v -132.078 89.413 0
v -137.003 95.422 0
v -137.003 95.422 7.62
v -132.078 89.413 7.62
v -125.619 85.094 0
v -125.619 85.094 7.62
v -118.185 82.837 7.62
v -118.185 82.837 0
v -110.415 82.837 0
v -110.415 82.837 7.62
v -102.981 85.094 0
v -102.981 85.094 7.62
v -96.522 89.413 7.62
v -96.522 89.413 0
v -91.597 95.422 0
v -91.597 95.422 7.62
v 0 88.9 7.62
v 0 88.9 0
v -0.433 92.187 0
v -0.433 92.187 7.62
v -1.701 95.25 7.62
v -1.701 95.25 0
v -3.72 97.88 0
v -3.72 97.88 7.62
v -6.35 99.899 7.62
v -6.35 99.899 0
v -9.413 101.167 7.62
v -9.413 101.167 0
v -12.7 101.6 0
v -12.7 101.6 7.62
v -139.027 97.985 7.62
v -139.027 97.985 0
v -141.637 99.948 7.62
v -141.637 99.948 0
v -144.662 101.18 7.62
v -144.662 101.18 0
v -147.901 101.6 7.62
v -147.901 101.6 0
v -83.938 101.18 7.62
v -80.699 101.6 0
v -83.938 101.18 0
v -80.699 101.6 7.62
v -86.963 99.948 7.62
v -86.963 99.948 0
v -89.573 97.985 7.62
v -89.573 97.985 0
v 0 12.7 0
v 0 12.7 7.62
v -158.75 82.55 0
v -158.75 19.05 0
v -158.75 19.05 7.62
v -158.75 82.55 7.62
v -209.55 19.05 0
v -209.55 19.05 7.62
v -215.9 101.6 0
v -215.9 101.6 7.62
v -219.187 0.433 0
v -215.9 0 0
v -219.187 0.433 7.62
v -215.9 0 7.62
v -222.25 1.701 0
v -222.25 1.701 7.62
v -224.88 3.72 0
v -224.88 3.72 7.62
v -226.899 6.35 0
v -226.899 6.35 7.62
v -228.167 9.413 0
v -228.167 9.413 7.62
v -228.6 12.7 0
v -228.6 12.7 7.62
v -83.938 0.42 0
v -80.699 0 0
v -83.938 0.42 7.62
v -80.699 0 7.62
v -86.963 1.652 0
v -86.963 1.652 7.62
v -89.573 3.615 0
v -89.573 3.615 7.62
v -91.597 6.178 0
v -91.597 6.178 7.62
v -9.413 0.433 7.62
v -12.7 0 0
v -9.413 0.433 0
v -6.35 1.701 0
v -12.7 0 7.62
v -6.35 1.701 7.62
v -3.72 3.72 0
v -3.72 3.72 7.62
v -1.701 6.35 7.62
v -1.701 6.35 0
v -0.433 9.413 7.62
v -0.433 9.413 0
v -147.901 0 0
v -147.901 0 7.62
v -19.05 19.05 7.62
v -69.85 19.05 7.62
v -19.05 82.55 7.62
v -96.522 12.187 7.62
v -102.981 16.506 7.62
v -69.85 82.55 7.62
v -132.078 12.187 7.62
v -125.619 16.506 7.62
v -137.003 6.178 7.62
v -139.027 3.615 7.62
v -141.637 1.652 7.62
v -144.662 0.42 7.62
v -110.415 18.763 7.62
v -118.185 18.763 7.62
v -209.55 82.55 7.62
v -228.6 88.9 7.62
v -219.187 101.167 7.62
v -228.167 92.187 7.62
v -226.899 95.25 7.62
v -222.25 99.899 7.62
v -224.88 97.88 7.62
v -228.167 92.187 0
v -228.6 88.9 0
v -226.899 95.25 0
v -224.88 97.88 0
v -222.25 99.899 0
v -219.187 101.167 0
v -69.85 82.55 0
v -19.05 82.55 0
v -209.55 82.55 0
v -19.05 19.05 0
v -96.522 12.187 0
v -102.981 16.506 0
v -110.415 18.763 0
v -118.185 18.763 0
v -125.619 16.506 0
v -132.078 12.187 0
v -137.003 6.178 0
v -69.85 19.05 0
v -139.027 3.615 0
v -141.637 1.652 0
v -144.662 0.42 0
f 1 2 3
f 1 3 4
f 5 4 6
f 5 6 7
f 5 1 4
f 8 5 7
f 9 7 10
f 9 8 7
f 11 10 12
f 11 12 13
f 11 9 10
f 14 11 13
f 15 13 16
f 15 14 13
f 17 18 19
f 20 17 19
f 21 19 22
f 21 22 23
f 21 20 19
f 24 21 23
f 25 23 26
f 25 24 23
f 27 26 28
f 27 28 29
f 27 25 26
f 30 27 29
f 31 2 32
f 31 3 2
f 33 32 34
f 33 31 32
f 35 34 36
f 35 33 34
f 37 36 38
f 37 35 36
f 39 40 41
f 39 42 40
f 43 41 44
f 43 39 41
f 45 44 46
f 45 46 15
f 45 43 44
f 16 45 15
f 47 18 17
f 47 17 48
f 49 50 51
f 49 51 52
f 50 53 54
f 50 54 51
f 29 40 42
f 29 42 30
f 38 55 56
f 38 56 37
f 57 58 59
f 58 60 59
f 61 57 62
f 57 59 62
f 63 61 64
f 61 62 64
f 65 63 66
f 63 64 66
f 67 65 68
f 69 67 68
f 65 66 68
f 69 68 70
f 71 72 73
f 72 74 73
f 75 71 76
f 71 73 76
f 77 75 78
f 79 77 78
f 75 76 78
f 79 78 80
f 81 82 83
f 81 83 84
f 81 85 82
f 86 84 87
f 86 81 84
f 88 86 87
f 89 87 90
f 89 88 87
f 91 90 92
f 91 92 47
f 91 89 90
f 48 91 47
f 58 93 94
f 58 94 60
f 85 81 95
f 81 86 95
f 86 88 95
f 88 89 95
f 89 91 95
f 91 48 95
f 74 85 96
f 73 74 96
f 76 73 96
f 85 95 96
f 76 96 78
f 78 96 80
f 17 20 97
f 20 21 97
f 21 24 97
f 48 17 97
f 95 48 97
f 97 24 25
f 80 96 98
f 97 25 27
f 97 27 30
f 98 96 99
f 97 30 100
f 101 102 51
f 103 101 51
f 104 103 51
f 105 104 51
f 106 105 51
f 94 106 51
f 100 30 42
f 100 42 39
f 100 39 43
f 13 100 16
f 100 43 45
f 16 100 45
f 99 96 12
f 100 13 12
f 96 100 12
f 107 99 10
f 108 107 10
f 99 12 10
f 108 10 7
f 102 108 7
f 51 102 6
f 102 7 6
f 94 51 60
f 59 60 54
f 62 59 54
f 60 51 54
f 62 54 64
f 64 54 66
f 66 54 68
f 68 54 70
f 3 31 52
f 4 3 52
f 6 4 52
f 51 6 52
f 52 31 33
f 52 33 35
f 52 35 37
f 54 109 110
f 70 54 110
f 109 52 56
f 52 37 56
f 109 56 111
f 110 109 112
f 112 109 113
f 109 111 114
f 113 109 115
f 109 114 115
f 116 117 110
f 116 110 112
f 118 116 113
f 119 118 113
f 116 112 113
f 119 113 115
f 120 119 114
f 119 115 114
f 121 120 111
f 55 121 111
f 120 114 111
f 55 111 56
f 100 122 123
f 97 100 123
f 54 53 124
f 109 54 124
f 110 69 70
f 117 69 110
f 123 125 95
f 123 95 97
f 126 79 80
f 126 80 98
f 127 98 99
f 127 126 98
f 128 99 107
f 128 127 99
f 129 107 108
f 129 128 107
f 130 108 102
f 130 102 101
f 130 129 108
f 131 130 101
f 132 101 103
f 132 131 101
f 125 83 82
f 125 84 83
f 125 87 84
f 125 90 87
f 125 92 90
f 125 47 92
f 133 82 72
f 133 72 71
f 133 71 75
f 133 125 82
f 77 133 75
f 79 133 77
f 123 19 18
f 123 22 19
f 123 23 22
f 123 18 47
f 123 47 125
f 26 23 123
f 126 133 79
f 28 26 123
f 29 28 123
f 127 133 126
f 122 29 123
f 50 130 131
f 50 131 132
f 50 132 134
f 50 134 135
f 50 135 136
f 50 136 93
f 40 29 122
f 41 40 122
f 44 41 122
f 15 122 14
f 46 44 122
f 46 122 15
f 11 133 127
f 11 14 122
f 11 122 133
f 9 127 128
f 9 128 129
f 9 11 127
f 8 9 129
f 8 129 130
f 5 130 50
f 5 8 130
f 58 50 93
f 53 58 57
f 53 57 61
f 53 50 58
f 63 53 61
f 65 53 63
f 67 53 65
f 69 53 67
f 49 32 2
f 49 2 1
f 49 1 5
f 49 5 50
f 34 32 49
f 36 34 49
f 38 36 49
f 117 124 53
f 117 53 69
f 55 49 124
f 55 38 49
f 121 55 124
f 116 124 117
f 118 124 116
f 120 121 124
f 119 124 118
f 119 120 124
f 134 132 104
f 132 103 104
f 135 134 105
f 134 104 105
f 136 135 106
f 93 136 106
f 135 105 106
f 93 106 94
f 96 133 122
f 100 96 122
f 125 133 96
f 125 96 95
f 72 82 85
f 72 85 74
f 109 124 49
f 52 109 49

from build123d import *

# Parameters (mm, degrees)
SKETCH1_W           = 50.8
SKETCH1_H           = 63.5
BOSS_EXTRUDE1_DEPTH = 7.62
FILLET1_R           = 12.7


with BuildPart() as part:
    # Sketch1 → Boss-Extrude1 (new body)
    with BuildSketch(Plane.XY):
        with BuildLine():
            Line((0, 0), (-88.9, 0))
            ThreePointArc((-88.9, 0), (-114.3, 19.05), (-139.7, 0))
            Line((-139.7, 0), (-228.6, 0))
            Line((-228.6, 0), (-228.6, 101.6))
            Line((-228.6, 101.6), (-139.7, 101.6))
            ThreePointArc((-139.7, 101.6), (-114.3, 82.55), (-88.9, 101.6))
            Line((-88.9, 101.6), (0, 101.6))
            Line((0, 101.6), (0, 0))
        make_face()
        with Locations((-184.15, 50.8)):
            Rectangle(SKETCH1_W, SKETCH1_H, mode=Mode.SUBTRACT)
        with Locations((-44.45, 50.8)):
            Rectangle(SKETCH1_W, SKETCH1_H, mode=Mode.SUBTRACT)
    extrude(amount=BOSS_EXTRUDE1_DEPTH)

    # Fillet1
    fillet1_edges = [part.edges().sort_by_distance(p)[0] for p in [
        (0, 0, 3.81),
        (-88.9, 0, 3.81),
        (-139.7, 0, 3.81),
        (-228.6, 0, 3.81),
        (-228.6, 101.6, 3.81),
        (-139.7, 101.6, 3.81),
        (-88.9, 101.6, 3.81),
        (0, 101.6, 3.81),
    ]]
    fillet(fillet1_edges, radius=FILLET1_R)


solid = part.part
